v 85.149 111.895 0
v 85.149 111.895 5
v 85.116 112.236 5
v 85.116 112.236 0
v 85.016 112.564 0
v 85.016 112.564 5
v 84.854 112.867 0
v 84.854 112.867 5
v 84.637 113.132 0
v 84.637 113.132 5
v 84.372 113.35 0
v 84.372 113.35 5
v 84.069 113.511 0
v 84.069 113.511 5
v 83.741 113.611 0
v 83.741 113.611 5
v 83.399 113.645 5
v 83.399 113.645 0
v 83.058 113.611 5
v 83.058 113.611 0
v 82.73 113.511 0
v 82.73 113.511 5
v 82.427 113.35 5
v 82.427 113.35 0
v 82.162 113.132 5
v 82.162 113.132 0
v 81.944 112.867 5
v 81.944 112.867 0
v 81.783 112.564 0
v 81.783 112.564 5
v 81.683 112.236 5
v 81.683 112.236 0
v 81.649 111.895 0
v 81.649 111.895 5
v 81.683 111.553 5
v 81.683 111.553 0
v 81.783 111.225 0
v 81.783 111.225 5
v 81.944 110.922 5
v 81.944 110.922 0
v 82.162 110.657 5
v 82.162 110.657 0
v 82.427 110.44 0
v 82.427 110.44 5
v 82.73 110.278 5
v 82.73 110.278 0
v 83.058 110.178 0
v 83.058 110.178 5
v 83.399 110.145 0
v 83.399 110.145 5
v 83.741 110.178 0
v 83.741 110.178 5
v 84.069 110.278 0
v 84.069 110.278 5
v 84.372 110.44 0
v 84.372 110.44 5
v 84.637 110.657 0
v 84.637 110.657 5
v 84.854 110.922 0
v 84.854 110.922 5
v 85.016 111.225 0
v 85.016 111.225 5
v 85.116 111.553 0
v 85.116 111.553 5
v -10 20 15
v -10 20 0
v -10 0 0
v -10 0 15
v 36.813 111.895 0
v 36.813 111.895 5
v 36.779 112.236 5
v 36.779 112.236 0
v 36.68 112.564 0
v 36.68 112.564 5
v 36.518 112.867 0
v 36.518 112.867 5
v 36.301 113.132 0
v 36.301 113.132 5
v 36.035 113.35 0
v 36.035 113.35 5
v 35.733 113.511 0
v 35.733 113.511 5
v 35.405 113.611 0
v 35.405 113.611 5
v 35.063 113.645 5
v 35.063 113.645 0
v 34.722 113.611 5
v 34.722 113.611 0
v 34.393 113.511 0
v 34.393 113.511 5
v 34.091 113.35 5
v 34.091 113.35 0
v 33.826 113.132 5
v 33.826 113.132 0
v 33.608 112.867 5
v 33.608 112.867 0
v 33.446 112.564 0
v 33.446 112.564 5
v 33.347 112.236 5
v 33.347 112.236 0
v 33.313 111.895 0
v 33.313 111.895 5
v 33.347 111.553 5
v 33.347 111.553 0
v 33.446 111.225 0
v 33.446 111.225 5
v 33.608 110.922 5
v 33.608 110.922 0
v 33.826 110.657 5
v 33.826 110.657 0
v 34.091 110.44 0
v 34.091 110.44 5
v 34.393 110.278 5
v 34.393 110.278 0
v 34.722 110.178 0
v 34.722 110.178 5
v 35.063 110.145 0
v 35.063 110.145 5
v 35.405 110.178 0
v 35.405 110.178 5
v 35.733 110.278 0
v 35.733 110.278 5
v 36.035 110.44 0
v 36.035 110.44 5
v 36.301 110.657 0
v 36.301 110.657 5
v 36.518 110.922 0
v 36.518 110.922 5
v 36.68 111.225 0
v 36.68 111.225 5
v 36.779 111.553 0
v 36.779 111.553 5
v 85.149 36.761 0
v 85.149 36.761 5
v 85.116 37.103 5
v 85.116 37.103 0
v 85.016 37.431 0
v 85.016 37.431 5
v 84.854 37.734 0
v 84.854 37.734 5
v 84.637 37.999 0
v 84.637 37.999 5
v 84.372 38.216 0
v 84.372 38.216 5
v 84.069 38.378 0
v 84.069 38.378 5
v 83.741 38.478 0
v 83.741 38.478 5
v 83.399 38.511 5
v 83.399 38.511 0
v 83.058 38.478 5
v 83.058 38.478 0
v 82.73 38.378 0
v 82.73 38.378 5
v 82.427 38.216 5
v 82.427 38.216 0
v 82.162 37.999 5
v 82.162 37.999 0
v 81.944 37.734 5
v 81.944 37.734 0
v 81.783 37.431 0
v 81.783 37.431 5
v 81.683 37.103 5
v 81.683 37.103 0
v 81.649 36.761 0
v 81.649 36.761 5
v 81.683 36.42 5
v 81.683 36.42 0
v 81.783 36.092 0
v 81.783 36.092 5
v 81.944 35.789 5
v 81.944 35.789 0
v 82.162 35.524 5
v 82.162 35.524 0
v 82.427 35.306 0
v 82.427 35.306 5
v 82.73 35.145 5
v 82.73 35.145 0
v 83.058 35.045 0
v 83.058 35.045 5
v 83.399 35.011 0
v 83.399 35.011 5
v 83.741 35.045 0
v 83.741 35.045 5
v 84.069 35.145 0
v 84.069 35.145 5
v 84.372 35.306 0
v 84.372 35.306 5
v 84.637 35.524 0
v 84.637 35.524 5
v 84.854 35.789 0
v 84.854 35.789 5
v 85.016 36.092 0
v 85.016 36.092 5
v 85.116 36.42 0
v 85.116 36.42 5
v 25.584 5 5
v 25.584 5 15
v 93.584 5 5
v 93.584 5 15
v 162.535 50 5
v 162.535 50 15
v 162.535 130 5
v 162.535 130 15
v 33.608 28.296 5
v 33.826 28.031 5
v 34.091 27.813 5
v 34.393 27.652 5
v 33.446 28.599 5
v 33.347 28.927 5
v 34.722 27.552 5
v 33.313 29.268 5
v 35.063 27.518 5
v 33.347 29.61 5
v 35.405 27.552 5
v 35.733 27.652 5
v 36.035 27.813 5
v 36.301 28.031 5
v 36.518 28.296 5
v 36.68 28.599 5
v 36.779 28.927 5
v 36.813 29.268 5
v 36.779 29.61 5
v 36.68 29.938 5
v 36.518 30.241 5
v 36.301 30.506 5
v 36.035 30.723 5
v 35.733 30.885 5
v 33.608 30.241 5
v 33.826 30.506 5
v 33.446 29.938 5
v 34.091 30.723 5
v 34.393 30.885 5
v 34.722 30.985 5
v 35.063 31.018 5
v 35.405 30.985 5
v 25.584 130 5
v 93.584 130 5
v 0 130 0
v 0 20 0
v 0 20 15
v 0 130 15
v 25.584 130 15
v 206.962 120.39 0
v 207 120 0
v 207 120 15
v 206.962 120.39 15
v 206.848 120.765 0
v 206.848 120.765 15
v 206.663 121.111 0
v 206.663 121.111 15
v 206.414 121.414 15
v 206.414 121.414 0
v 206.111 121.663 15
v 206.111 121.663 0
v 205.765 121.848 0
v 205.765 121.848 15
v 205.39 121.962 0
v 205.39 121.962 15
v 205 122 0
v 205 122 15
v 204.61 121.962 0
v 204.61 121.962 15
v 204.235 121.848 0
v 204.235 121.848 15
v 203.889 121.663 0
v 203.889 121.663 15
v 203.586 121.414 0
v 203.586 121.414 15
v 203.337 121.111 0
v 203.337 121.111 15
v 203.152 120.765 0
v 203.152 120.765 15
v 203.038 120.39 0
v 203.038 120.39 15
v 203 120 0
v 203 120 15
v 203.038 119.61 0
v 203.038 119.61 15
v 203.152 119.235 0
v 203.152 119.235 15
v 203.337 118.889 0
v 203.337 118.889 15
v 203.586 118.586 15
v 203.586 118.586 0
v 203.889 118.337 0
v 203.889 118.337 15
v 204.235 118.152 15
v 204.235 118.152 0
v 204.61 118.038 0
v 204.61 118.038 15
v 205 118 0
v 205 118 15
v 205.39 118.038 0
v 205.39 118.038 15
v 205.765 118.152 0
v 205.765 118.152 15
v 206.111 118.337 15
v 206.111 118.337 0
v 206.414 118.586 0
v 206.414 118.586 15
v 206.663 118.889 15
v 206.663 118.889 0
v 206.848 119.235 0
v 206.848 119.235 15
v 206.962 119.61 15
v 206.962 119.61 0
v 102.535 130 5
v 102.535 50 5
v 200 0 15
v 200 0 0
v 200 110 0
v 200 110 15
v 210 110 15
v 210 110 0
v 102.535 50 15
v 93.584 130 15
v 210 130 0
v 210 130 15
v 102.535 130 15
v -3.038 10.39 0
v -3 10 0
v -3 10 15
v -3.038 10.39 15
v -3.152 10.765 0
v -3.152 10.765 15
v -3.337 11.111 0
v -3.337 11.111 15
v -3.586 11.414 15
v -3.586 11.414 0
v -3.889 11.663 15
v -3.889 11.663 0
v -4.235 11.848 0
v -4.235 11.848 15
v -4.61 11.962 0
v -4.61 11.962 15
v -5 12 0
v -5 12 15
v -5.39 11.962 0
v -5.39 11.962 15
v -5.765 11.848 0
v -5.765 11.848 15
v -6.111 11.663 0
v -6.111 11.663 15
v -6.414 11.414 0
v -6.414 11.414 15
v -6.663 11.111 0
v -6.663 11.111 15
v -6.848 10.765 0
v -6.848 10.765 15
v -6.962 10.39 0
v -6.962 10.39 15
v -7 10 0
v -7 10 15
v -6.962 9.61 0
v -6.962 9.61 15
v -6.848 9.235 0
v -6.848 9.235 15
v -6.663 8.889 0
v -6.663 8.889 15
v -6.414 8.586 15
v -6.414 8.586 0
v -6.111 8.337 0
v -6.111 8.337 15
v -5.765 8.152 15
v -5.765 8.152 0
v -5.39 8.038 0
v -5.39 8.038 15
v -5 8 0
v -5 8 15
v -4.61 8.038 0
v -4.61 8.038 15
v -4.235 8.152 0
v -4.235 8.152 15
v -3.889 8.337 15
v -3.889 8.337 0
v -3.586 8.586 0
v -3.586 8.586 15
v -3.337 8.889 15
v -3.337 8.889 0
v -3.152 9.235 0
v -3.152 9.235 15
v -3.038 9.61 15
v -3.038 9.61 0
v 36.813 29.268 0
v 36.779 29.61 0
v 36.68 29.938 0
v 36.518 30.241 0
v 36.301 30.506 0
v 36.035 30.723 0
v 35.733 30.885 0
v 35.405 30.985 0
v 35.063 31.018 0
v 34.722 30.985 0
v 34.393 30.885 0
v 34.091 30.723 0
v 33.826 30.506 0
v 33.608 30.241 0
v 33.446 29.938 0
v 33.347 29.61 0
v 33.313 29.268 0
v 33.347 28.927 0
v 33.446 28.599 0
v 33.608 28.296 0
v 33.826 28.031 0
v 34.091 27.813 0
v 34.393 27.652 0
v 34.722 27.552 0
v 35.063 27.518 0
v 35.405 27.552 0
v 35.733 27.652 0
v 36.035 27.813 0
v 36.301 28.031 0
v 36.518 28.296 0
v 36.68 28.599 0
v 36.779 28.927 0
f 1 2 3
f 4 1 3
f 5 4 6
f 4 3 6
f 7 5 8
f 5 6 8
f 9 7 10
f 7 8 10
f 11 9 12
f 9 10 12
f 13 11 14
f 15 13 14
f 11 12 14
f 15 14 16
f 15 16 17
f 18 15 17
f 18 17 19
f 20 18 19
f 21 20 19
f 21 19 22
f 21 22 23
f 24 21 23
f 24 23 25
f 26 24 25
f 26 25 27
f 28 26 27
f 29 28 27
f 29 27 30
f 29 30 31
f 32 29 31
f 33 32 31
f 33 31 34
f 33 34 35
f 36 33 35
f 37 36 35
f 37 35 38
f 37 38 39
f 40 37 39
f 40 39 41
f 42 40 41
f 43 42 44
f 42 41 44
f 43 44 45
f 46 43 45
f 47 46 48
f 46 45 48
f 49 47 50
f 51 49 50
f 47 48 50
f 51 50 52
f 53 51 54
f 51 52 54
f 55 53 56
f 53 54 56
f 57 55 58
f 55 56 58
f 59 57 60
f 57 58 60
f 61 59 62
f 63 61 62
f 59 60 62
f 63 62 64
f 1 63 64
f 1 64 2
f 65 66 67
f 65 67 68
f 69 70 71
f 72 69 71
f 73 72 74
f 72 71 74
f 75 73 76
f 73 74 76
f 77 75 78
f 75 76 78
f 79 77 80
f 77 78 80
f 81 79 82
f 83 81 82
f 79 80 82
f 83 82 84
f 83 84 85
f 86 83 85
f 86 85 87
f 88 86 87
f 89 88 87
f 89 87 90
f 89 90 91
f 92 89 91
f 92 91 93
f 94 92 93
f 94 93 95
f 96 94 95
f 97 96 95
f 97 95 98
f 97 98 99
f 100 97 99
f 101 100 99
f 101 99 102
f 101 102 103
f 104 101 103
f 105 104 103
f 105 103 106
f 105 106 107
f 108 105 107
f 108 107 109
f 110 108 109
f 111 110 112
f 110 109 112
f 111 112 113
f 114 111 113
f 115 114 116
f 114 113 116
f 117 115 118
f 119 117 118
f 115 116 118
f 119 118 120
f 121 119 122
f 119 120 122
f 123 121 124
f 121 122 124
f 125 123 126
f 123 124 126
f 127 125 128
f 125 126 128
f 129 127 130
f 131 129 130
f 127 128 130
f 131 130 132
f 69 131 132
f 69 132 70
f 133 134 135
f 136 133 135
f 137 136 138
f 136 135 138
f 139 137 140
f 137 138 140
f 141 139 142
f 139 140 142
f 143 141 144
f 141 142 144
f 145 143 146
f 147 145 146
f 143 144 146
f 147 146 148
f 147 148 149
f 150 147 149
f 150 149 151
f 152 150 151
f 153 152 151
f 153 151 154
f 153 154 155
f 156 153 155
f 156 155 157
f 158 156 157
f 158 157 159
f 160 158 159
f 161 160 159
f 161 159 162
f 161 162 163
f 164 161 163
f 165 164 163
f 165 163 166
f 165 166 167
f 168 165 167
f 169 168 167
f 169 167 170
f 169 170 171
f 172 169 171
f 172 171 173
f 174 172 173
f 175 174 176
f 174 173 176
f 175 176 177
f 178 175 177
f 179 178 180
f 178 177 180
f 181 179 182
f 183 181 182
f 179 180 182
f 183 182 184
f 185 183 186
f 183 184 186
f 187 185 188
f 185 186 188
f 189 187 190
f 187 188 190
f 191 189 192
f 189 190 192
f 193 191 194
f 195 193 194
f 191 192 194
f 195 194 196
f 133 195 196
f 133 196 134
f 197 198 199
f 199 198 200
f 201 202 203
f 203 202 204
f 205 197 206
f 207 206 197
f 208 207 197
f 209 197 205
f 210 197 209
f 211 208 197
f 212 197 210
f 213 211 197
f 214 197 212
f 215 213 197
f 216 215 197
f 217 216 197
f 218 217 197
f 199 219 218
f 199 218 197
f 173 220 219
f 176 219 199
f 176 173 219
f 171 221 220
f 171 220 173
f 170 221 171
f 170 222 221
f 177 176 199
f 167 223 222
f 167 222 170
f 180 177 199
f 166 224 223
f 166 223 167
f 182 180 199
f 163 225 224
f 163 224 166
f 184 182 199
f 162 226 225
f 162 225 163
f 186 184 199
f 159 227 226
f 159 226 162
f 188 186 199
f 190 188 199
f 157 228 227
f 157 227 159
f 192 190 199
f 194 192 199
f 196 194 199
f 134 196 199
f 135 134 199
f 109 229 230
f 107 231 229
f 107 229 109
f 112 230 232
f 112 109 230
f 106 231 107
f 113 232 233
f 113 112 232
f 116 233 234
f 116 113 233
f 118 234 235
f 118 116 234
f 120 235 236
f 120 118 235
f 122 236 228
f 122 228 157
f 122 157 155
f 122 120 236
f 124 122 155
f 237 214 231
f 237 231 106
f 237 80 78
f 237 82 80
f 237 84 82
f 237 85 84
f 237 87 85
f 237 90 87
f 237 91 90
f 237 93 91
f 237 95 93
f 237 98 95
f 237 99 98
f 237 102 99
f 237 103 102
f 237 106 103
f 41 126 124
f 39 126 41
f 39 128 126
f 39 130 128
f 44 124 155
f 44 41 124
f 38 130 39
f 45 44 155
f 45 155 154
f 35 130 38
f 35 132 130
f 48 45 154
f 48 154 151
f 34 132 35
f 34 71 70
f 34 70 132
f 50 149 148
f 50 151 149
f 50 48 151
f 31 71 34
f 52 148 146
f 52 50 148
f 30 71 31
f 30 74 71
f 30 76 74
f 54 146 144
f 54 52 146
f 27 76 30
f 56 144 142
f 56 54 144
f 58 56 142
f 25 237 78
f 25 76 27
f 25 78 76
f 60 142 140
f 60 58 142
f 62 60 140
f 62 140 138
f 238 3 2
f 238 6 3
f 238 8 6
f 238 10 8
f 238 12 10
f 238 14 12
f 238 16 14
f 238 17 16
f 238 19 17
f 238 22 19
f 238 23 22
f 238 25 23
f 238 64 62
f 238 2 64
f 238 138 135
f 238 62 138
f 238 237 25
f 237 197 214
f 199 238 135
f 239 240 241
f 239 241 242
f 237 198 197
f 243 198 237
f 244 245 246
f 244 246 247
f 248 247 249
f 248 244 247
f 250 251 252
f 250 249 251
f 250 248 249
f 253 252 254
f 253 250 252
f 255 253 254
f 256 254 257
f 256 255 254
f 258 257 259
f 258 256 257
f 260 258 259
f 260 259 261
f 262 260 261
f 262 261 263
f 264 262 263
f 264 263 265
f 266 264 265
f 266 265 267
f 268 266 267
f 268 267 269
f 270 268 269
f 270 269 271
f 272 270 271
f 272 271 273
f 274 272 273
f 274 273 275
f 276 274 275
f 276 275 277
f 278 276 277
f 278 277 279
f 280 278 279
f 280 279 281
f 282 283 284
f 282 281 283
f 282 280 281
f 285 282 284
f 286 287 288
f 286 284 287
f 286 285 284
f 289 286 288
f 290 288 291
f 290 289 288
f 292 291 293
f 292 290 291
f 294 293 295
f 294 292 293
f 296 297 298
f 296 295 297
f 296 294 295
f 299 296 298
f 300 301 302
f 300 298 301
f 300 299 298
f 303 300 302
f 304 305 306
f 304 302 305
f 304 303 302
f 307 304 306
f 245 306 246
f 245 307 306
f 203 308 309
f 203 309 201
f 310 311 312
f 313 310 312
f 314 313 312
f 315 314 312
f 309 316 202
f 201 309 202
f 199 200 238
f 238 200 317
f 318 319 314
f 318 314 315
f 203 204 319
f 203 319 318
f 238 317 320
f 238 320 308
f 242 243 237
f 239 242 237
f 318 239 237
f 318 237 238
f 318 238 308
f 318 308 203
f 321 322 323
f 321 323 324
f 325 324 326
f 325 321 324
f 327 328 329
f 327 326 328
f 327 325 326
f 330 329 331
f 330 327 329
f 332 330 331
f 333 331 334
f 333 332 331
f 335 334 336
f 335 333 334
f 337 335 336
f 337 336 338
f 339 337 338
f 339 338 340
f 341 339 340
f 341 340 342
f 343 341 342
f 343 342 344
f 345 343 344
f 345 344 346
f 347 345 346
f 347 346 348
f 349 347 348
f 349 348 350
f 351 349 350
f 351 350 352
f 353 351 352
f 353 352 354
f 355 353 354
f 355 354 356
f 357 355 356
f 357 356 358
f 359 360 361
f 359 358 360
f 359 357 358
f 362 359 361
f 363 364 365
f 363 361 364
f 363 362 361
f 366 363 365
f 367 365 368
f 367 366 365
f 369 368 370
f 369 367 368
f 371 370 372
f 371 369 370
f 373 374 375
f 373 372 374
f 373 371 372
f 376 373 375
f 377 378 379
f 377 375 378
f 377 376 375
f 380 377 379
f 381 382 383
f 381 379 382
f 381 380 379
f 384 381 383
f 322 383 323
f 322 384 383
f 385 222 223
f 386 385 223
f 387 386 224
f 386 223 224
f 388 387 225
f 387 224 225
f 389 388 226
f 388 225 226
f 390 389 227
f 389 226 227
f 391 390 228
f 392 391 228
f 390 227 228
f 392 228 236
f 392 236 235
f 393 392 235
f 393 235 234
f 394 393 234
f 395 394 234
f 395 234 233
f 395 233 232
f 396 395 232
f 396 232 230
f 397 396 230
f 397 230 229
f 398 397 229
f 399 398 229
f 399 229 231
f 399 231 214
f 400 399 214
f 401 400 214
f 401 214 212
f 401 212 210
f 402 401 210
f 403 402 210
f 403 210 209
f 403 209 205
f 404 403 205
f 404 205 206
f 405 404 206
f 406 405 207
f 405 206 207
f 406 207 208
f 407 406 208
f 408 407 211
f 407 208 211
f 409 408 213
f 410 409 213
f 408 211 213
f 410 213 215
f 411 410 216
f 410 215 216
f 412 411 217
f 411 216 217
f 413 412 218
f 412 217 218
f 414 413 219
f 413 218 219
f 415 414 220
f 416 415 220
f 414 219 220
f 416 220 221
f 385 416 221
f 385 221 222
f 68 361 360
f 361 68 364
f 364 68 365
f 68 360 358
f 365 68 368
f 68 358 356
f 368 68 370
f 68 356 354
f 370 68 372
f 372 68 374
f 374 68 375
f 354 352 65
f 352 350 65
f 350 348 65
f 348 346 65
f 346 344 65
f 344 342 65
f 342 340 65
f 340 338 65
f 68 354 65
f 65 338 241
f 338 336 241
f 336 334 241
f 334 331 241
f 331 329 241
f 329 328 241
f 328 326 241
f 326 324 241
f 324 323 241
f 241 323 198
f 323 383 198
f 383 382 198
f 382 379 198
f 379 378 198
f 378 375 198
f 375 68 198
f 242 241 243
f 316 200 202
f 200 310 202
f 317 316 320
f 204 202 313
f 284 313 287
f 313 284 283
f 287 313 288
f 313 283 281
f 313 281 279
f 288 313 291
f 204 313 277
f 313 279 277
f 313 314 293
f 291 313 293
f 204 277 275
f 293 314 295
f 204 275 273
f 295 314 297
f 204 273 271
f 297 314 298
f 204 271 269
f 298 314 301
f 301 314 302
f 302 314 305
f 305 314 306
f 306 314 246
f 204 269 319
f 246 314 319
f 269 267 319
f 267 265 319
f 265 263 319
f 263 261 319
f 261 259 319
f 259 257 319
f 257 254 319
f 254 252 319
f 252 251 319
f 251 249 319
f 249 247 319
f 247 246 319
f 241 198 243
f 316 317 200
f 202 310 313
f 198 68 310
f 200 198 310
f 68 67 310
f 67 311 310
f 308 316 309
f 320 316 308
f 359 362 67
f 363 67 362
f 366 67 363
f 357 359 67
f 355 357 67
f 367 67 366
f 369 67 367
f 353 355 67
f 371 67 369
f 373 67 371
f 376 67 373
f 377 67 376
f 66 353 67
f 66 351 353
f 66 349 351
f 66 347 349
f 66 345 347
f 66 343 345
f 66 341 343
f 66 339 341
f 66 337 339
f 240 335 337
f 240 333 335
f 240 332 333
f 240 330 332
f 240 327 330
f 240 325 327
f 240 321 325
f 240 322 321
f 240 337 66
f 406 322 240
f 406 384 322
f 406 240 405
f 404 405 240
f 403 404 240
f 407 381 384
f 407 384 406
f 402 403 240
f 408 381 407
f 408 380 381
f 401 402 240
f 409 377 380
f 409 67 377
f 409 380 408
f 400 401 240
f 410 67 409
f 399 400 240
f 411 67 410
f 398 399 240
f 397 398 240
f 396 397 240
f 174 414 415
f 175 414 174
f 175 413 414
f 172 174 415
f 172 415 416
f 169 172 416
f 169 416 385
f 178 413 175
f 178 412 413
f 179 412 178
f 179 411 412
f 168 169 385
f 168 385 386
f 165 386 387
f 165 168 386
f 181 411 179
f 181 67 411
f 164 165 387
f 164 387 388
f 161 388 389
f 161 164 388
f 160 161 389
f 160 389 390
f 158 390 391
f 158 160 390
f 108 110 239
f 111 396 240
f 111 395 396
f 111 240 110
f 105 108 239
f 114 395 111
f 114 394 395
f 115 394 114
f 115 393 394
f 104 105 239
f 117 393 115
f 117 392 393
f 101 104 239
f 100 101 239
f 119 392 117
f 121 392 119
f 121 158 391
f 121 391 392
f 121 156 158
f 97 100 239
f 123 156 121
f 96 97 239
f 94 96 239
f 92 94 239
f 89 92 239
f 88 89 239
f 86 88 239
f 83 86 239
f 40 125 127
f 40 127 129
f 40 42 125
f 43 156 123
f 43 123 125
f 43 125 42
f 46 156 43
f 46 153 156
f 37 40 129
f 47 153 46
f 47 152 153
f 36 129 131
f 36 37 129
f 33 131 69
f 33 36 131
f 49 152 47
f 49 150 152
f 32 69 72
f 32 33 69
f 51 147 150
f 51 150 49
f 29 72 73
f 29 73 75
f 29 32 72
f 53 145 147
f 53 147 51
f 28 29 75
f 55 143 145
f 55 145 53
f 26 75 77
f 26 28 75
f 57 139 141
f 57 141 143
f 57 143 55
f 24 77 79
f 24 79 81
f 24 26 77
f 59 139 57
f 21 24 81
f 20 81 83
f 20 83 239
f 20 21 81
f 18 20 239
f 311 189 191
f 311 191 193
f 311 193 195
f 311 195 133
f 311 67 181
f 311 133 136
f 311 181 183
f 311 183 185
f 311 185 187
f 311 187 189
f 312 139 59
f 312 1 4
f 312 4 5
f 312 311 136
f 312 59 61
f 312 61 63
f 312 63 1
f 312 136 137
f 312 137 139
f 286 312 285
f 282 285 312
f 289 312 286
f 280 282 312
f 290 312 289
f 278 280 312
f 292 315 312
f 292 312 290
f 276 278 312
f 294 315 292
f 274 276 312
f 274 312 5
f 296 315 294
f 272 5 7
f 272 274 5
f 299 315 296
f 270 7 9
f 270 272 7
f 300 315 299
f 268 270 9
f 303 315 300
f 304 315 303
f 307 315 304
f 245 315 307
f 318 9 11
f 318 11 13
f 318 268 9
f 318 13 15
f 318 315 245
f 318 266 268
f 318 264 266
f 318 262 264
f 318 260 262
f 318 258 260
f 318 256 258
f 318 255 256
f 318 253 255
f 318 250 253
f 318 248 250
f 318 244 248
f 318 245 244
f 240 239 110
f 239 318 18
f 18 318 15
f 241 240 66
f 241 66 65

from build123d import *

# Parameters (mm, degrees)
SKETCH1_W                = 200
SKETCH1_H                = 130
BOSS_EXTRUDE1_DEPTH      = 15
SKETCH2_W                = 68
SKETCH2_H                = 125
SKETCH2_W_2              = 60
SKETCH2_H_2              = 80
CUT_EXTRUDE1_DEPTH       = 10
SKETCH6_R                = 1.75
CUT_EXTRUDE10_DEPTH      = 15
SKETCH7_W                = 15
SKETCH7_H                = 20
BOSS_EXTRUDE2_DEPTH      = 10
SKETCH8_W                = 15
SKETCH8_H                = 20
BOSS_EXTRUDE3_DEPTH      = 10
CUT_EXTRUDE11_DEPTH      = 40
CUT_EXTRUDE11_DEPTH_BACK = 40
SKETCH9_R                = 2


with BuildPart() as part:
    # Sketch1 → Boss-Extrude1 (new body)
    with BuildSketch(Plane.XY):
        with Locations((100, 65)):
            Rectangle(SKETCH1_W, SKETCH1_H)
    extrude(amount=BOSS_EXTRUDE1_DEPTH)

    # Sketch2 → Cut-Extrude1 (cut)
    with BuildSketch(Plane.XY.offset(15)):
        with Locations((59.584038162, 67.5)):
            Rectangle(SKETCH2_W, SKETCH2_H)
        with Locations((132.534942581, 90)):
            Rectangle(SKETCH2_W_2, SKETCH2_H_2)
    extrude(amount=-CUT_EXTRUDE1_DEPTH, mode=Mode.SUBTRACT)

    # Sketch6 → Cut-Extrude10 (cut)
    with BuildSketch(Plane.XY.offset(15)):
        with Locations((35.063099212, 111.894617683)):
            Circle(SKETCH6_R)
        with Locations((83.399299212, 111.894617683)):
            Circle(SKETCH6_R)
        with Locations((83.399299212, 36.761417683)):
            Circle(SKETCH6_R)
        with Locations((35.063099212, 29.268417683)):
            Circle(SKETCH6_R)
    extrude(amount=-CUT_EXTRUDE10_DEPTH, mode=Mode.SUBTRACT)

    # Sketch7 → Boss-Extrude2 (add)
    with BuildSketch(Plane(origin=(200, 0, 0), x_dir=(0, 0, -1), z_dir=(1, 0, 0))):
        with Locations((-7.5, 120)):
            Rectangle(SKETCH7_W, SKETCH7_H)
    extrude(amount=BOSS_EXTRUDE2_DEPTH)

    # Sketch8 → Boss-Extrude3 (add)
    with BuildSketch(Plane.ZY):
        with Locations((7.5, 10)):
            Rectangle(SKETCH8_W, SKETCH8_H)
    extrude(amount=BOSS_EXTRUDE3_DEPTH)

    # Sketch9 → Cut-Extrude11 (cut, two sides: drawn at the far end of the back side and taken through both)
    with BuildSketch(Plane.XY.offset(15).offset(-CUT_EXTRUDE11_DEPTH_BACK)):
        with Locations((-5, 10)):
            Circle(SKETCH9_R)
        with Locations((205, 120)):
            Circle(SKETCH9_R)
    extrude(amount=CUT_EXTRUDE11_DEPTH + CUT_EXTRUDE11_DEPTH_BACK, mode=Mode.SUBTRACT)


solid = part.part
